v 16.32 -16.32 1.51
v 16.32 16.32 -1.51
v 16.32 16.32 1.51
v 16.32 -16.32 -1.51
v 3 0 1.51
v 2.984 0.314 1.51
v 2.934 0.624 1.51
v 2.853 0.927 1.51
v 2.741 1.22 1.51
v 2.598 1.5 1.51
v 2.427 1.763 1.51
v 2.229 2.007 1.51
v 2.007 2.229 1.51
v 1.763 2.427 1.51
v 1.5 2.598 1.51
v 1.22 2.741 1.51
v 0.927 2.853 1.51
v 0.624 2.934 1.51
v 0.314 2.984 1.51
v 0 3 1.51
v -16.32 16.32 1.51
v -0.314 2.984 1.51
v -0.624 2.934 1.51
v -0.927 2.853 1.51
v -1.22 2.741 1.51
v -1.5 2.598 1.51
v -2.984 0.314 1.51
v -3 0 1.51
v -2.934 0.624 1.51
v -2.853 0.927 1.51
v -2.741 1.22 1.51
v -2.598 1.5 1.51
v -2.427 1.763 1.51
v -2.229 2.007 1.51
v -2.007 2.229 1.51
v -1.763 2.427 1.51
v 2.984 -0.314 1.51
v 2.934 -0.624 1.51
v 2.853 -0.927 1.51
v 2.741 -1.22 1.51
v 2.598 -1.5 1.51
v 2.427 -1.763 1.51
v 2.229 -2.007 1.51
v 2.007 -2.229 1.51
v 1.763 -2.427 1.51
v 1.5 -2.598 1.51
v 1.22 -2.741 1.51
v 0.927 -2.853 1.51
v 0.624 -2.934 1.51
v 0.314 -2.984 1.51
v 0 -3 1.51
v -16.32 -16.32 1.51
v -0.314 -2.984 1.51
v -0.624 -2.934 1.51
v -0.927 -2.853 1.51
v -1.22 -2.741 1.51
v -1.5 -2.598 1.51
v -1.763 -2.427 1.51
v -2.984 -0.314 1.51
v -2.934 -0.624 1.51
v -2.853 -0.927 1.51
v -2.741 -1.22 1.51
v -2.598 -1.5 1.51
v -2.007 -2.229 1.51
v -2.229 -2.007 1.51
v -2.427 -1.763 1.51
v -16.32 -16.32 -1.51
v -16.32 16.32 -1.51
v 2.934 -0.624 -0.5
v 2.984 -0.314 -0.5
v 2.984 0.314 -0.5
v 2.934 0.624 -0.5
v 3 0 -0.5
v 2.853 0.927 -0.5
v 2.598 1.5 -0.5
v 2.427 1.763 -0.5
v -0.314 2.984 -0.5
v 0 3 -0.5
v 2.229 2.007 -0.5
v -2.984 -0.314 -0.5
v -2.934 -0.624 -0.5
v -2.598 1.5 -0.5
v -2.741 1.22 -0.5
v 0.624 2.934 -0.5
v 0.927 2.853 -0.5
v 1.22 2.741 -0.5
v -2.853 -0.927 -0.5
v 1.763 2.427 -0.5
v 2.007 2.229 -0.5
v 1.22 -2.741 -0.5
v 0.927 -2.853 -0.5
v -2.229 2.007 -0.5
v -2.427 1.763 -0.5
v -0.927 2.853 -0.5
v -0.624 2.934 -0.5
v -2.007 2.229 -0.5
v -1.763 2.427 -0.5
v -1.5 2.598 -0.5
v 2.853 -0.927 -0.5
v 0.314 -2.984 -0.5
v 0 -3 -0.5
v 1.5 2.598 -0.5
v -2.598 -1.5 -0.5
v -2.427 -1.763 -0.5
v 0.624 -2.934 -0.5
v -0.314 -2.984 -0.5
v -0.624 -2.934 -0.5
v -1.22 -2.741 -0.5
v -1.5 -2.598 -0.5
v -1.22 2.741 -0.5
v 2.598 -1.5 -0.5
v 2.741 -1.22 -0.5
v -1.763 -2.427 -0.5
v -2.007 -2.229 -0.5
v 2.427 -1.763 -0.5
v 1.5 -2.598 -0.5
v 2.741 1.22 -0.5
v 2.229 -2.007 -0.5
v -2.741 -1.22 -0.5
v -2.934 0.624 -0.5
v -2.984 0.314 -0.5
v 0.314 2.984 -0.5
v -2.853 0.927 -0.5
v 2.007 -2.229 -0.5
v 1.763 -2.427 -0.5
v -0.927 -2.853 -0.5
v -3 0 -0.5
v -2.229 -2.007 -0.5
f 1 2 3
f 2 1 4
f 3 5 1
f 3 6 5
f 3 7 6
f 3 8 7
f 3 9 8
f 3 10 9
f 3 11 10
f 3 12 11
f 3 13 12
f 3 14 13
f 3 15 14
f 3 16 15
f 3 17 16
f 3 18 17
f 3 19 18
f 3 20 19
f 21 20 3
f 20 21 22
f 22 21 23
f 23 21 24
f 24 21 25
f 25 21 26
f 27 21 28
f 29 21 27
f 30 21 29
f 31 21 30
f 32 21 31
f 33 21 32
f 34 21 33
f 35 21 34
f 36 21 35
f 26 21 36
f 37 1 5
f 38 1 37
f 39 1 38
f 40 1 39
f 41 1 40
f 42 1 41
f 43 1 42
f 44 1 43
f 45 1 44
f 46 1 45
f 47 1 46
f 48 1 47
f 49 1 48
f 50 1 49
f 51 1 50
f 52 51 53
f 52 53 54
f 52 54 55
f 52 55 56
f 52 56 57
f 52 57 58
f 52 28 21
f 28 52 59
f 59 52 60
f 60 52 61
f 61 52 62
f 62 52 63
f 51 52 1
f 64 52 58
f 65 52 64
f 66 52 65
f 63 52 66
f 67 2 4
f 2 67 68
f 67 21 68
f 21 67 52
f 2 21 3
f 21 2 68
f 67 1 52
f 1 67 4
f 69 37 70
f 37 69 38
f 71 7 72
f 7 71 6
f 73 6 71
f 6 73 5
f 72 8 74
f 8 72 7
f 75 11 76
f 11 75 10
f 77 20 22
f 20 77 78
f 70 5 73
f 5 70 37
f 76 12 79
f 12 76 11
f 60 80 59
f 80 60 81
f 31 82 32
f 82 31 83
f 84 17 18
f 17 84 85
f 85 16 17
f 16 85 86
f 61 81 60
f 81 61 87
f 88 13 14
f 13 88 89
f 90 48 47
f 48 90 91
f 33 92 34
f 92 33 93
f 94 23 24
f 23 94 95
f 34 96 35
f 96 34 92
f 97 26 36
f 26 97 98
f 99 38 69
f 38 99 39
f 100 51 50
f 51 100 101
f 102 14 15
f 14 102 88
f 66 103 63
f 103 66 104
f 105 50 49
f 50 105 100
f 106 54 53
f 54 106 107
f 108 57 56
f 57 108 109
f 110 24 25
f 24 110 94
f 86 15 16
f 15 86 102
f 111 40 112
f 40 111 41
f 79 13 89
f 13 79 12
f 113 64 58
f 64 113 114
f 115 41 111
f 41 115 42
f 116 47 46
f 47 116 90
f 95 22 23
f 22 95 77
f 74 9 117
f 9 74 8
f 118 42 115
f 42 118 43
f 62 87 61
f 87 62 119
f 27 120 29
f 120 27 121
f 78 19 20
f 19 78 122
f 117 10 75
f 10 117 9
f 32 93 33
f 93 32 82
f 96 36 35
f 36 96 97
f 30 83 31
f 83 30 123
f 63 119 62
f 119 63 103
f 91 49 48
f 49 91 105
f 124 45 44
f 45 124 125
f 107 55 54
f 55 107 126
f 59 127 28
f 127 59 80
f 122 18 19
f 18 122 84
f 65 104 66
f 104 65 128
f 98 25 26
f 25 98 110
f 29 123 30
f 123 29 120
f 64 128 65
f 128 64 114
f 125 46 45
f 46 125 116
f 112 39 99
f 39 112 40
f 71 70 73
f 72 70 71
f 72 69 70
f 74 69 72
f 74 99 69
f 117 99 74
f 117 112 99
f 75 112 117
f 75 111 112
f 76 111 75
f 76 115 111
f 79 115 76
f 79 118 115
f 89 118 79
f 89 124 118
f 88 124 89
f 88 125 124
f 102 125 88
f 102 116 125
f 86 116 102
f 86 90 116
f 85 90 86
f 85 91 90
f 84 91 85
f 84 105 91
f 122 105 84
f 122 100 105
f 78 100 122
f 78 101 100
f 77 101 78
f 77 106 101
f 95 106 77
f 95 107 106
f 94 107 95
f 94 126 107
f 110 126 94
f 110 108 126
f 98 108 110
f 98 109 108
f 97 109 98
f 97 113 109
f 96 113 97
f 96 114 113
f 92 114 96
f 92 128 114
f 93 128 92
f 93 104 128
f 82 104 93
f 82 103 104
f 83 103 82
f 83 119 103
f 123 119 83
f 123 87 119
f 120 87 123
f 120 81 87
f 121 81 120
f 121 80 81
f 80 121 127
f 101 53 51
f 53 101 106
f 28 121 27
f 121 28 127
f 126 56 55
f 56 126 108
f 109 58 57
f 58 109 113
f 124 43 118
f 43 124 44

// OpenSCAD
$fn = ($preview ?  7:60 );


size=32;
th=3.0;

md = 5.0;
mt = 1.5;




mag_th = mt + 0.5;
mag_dia = md + 1;

difference(){
cube([size*1.02,size*1.02,th+0.02],center=true); 
translate([0,0,(th/2)-mag_th]) cylinder(h=10, d=mag_dia);   
}
